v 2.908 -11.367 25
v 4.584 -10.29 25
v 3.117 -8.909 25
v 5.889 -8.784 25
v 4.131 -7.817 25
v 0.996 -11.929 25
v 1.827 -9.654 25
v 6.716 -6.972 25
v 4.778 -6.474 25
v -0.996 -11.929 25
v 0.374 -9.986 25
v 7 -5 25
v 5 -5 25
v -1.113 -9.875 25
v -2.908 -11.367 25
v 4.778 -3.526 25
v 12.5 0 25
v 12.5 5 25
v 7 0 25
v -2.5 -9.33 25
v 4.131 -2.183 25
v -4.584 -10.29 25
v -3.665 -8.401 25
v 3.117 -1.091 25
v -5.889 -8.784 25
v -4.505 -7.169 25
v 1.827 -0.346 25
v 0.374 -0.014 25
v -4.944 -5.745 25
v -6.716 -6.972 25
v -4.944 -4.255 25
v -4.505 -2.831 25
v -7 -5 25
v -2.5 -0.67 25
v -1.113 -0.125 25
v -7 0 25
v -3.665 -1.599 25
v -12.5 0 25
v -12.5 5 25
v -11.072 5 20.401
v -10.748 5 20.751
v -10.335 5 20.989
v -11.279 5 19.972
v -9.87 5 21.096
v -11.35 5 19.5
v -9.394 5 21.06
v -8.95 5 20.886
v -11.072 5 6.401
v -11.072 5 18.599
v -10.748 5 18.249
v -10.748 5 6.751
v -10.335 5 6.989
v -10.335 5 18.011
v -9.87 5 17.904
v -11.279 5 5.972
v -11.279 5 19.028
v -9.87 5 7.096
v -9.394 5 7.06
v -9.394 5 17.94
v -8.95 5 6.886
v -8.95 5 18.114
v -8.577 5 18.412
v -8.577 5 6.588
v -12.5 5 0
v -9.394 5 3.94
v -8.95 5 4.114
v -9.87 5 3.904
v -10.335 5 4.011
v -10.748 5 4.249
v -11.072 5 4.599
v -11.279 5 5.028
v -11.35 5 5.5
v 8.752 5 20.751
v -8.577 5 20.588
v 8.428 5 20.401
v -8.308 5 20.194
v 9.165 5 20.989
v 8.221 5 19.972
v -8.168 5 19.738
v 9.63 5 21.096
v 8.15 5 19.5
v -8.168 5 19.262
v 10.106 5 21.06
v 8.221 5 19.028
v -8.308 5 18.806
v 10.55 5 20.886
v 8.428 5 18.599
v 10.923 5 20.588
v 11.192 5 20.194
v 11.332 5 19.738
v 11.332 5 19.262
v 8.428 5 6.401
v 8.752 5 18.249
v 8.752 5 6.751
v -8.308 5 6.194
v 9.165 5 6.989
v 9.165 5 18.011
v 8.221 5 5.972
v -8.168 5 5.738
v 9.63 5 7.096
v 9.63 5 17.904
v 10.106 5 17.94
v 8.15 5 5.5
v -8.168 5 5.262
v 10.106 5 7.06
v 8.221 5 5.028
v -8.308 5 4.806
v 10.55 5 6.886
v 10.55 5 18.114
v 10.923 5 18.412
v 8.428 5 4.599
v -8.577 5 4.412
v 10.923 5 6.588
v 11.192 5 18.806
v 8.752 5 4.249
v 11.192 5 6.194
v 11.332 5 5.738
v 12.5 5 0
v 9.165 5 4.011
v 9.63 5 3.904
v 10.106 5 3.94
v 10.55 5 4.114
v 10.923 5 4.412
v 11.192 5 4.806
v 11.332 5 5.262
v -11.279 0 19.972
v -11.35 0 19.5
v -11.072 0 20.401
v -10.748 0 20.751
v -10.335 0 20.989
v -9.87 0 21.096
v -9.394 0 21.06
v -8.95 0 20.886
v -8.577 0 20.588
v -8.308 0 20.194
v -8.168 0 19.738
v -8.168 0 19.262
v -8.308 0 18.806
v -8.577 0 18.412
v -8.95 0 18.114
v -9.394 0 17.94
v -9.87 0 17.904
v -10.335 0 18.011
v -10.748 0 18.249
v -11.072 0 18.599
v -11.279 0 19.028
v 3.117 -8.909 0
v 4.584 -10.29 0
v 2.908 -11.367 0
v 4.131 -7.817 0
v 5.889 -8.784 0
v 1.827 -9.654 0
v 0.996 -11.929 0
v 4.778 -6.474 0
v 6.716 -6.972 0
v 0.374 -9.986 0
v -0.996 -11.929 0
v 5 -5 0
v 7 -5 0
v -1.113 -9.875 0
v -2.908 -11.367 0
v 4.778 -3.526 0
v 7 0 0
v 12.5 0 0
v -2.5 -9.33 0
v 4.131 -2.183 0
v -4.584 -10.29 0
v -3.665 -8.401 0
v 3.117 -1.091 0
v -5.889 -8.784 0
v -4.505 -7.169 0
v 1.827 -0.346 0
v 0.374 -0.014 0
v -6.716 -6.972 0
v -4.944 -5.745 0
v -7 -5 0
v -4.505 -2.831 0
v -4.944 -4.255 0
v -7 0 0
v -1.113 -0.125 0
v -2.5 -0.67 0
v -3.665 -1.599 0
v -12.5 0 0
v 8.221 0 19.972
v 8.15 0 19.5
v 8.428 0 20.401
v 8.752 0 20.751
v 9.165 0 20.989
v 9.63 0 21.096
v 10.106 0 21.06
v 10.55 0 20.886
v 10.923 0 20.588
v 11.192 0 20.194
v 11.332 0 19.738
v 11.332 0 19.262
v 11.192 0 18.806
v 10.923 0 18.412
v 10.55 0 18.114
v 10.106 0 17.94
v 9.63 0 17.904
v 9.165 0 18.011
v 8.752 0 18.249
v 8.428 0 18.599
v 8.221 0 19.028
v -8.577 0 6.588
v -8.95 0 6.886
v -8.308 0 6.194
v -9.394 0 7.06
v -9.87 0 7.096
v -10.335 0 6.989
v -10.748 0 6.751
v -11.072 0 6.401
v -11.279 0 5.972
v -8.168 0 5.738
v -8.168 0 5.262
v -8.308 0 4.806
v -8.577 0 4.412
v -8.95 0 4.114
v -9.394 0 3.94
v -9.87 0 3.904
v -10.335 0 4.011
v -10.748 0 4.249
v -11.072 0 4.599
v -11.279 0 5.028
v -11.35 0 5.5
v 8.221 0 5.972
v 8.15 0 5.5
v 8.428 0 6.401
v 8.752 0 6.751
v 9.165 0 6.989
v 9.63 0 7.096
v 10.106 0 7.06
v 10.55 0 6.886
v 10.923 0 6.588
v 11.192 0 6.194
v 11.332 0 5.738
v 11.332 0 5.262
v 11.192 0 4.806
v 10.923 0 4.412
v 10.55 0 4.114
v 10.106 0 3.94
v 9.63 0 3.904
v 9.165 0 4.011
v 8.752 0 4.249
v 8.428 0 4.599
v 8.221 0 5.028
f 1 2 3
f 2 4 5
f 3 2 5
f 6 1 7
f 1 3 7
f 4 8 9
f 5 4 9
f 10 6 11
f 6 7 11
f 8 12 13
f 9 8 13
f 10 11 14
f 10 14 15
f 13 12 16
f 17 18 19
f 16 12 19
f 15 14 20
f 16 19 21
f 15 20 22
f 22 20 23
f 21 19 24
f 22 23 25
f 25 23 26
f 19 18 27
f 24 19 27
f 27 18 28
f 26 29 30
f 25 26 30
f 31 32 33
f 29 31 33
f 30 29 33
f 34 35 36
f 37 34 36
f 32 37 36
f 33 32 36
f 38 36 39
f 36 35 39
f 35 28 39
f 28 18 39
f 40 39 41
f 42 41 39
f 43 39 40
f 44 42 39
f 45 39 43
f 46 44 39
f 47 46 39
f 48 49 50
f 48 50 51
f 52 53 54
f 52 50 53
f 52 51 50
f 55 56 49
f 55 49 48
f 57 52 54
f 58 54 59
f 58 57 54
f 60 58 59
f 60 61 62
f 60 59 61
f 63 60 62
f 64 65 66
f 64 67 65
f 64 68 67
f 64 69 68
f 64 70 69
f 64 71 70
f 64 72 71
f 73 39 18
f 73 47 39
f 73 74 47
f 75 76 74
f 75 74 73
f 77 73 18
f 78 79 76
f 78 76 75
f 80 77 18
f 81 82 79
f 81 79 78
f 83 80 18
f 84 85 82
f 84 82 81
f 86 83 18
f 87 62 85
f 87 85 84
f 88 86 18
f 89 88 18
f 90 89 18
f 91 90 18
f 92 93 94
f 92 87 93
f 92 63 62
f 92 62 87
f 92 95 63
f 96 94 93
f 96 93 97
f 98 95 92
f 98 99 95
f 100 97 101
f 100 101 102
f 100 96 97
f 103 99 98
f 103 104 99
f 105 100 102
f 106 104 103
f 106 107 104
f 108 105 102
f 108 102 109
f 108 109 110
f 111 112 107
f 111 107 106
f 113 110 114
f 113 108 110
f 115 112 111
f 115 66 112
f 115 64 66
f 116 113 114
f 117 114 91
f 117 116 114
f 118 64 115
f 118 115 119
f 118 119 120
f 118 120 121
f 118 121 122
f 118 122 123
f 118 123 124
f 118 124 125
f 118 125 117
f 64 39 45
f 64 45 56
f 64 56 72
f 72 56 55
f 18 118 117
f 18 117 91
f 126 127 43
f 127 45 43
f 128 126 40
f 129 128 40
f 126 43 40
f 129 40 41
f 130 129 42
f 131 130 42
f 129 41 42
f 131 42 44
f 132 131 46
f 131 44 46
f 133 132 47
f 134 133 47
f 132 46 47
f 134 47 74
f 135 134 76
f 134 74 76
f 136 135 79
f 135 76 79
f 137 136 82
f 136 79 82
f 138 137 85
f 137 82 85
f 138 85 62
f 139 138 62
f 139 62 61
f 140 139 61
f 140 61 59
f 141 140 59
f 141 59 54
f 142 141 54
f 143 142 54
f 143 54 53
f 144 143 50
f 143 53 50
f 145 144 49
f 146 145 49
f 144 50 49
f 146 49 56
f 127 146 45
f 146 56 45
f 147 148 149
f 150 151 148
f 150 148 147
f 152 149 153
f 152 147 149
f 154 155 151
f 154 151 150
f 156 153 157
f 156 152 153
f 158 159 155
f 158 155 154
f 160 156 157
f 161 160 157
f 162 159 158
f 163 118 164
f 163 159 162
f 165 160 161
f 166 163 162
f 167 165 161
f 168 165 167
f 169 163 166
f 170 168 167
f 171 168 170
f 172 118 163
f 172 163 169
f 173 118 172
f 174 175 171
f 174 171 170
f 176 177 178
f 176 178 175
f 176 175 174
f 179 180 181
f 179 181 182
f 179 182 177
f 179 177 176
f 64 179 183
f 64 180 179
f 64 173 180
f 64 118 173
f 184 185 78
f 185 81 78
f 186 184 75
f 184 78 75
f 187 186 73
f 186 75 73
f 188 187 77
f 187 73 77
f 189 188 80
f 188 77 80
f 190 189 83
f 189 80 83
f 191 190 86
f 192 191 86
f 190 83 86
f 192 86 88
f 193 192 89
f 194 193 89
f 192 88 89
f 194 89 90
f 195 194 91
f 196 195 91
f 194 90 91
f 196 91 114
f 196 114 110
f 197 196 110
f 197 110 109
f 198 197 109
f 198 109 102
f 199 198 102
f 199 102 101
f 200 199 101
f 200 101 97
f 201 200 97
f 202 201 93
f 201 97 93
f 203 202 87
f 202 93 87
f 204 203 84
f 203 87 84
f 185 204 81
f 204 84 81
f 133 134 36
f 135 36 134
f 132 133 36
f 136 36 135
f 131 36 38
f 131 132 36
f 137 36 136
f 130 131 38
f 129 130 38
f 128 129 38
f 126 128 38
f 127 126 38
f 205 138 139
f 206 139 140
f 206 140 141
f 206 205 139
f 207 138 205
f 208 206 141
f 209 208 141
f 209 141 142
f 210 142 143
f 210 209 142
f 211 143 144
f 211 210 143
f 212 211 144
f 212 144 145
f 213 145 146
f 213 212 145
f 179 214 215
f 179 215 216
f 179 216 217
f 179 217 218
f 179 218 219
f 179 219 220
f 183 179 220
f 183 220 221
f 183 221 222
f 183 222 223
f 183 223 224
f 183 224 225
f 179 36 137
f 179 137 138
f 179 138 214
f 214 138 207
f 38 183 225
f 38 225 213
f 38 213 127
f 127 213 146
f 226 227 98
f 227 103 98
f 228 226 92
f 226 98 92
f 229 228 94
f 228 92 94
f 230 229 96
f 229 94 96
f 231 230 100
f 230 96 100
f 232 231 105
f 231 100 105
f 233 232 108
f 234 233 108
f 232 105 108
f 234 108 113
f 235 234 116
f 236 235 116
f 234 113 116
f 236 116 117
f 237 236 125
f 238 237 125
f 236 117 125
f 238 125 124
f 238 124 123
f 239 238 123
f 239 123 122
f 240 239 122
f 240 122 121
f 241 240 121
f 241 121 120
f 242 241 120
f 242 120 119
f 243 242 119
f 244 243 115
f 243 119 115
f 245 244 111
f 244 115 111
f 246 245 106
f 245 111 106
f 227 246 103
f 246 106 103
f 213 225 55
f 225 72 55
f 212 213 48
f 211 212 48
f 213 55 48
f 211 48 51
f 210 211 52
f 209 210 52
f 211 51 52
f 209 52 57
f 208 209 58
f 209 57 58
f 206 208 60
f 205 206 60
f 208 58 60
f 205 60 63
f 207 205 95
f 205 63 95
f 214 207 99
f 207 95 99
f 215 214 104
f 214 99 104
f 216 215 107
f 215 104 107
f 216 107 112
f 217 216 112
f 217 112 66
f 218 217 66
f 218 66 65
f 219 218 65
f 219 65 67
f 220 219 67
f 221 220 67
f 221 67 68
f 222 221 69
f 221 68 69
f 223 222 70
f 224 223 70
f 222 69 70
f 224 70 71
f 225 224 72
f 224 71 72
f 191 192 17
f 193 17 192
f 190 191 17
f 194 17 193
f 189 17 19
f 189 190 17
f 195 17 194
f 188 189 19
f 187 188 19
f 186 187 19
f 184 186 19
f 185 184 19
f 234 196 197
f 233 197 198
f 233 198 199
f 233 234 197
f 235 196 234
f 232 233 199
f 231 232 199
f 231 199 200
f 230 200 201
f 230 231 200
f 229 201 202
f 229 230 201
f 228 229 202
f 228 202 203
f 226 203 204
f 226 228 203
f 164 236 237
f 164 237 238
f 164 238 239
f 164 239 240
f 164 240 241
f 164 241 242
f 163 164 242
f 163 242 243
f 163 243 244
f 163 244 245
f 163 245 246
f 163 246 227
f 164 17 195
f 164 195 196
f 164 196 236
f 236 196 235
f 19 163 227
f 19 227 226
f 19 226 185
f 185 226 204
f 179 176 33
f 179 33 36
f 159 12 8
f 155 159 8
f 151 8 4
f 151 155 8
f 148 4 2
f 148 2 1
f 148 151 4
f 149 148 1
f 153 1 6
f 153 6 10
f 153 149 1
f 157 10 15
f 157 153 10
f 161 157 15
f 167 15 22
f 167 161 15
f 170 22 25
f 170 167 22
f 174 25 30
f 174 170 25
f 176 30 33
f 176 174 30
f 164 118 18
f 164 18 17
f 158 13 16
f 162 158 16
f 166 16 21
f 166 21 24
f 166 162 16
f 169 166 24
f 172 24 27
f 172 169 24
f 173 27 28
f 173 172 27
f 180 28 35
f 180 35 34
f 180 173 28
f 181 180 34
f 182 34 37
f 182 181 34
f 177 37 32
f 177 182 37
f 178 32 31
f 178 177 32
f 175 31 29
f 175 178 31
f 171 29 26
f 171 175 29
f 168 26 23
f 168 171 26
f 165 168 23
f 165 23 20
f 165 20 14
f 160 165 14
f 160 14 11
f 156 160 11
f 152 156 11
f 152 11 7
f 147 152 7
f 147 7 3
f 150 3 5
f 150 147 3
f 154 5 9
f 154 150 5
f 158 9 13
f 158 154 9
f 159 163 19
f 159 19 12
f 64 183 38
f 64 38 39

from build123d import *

# Parameters (mm, degrees)
SZKIC1_R                    = 5
DODANIE_WYCI_GNI_CIE1_DEPTH = 25
OTW_R_3_2_3_2_1_D           = 3.2
OTW_R_3_2_3_2_1_DEPTH       = 5
OTW_R_3_2_3_2_1_TIP         = 0.96137699


with BuildPart() as part:
    # Szkic1 → Dodanie-wyciągnięcie1 (new body)
    with BuildSketch(Plane.XY):
        with BuildLine():
            Line((-7, -5), (-7, 0))
            Line((-7, 0), (-12.5, 0))
            Line((-12.5, 0), (-12.5, 5))
            Line((-12.5, 5), (12.5, 5))
            Line((12.5, 5), (12.5, 0))
            Line((12.5, 0), (7, 0))
            Line((7, 0), (7, -5))
            ThreePointArc((7, -5), (0, -12), (-7, -5))
        make_face()
        with Locations((0, -5)):
            Circle(SZKIC1_R, mode=Mode.SUBTRACT)
    extrude(amount=DODANIE_WYCI_GNI_CIE1_DEPTH)

    # Otwór Ø3.2 (3.2)1
    with Locations(Plane.XZ):
        with Locations((9.75, 19.5), (-9.75, 19.5), (-9.75, 5.5), (9.75, 5.5)):
            Hole(OTW_R_3_2_3_2_1_D / 2, depth=OTW_R_3_2_3_2_1_DEPTH)
            with Locations((0, 0, -(OTW_R_3_2_3_2_1_DEPTH + OTW_R_3_2_3_2_1_TIP / 2))):  # 118° drill point
                Cone(0, OTW_R_3_2_3_2_1_D / 2, OTW_R_3_2_3_2_1_TIP, mode=Mode.SUBTRACT)


solid = part.part
